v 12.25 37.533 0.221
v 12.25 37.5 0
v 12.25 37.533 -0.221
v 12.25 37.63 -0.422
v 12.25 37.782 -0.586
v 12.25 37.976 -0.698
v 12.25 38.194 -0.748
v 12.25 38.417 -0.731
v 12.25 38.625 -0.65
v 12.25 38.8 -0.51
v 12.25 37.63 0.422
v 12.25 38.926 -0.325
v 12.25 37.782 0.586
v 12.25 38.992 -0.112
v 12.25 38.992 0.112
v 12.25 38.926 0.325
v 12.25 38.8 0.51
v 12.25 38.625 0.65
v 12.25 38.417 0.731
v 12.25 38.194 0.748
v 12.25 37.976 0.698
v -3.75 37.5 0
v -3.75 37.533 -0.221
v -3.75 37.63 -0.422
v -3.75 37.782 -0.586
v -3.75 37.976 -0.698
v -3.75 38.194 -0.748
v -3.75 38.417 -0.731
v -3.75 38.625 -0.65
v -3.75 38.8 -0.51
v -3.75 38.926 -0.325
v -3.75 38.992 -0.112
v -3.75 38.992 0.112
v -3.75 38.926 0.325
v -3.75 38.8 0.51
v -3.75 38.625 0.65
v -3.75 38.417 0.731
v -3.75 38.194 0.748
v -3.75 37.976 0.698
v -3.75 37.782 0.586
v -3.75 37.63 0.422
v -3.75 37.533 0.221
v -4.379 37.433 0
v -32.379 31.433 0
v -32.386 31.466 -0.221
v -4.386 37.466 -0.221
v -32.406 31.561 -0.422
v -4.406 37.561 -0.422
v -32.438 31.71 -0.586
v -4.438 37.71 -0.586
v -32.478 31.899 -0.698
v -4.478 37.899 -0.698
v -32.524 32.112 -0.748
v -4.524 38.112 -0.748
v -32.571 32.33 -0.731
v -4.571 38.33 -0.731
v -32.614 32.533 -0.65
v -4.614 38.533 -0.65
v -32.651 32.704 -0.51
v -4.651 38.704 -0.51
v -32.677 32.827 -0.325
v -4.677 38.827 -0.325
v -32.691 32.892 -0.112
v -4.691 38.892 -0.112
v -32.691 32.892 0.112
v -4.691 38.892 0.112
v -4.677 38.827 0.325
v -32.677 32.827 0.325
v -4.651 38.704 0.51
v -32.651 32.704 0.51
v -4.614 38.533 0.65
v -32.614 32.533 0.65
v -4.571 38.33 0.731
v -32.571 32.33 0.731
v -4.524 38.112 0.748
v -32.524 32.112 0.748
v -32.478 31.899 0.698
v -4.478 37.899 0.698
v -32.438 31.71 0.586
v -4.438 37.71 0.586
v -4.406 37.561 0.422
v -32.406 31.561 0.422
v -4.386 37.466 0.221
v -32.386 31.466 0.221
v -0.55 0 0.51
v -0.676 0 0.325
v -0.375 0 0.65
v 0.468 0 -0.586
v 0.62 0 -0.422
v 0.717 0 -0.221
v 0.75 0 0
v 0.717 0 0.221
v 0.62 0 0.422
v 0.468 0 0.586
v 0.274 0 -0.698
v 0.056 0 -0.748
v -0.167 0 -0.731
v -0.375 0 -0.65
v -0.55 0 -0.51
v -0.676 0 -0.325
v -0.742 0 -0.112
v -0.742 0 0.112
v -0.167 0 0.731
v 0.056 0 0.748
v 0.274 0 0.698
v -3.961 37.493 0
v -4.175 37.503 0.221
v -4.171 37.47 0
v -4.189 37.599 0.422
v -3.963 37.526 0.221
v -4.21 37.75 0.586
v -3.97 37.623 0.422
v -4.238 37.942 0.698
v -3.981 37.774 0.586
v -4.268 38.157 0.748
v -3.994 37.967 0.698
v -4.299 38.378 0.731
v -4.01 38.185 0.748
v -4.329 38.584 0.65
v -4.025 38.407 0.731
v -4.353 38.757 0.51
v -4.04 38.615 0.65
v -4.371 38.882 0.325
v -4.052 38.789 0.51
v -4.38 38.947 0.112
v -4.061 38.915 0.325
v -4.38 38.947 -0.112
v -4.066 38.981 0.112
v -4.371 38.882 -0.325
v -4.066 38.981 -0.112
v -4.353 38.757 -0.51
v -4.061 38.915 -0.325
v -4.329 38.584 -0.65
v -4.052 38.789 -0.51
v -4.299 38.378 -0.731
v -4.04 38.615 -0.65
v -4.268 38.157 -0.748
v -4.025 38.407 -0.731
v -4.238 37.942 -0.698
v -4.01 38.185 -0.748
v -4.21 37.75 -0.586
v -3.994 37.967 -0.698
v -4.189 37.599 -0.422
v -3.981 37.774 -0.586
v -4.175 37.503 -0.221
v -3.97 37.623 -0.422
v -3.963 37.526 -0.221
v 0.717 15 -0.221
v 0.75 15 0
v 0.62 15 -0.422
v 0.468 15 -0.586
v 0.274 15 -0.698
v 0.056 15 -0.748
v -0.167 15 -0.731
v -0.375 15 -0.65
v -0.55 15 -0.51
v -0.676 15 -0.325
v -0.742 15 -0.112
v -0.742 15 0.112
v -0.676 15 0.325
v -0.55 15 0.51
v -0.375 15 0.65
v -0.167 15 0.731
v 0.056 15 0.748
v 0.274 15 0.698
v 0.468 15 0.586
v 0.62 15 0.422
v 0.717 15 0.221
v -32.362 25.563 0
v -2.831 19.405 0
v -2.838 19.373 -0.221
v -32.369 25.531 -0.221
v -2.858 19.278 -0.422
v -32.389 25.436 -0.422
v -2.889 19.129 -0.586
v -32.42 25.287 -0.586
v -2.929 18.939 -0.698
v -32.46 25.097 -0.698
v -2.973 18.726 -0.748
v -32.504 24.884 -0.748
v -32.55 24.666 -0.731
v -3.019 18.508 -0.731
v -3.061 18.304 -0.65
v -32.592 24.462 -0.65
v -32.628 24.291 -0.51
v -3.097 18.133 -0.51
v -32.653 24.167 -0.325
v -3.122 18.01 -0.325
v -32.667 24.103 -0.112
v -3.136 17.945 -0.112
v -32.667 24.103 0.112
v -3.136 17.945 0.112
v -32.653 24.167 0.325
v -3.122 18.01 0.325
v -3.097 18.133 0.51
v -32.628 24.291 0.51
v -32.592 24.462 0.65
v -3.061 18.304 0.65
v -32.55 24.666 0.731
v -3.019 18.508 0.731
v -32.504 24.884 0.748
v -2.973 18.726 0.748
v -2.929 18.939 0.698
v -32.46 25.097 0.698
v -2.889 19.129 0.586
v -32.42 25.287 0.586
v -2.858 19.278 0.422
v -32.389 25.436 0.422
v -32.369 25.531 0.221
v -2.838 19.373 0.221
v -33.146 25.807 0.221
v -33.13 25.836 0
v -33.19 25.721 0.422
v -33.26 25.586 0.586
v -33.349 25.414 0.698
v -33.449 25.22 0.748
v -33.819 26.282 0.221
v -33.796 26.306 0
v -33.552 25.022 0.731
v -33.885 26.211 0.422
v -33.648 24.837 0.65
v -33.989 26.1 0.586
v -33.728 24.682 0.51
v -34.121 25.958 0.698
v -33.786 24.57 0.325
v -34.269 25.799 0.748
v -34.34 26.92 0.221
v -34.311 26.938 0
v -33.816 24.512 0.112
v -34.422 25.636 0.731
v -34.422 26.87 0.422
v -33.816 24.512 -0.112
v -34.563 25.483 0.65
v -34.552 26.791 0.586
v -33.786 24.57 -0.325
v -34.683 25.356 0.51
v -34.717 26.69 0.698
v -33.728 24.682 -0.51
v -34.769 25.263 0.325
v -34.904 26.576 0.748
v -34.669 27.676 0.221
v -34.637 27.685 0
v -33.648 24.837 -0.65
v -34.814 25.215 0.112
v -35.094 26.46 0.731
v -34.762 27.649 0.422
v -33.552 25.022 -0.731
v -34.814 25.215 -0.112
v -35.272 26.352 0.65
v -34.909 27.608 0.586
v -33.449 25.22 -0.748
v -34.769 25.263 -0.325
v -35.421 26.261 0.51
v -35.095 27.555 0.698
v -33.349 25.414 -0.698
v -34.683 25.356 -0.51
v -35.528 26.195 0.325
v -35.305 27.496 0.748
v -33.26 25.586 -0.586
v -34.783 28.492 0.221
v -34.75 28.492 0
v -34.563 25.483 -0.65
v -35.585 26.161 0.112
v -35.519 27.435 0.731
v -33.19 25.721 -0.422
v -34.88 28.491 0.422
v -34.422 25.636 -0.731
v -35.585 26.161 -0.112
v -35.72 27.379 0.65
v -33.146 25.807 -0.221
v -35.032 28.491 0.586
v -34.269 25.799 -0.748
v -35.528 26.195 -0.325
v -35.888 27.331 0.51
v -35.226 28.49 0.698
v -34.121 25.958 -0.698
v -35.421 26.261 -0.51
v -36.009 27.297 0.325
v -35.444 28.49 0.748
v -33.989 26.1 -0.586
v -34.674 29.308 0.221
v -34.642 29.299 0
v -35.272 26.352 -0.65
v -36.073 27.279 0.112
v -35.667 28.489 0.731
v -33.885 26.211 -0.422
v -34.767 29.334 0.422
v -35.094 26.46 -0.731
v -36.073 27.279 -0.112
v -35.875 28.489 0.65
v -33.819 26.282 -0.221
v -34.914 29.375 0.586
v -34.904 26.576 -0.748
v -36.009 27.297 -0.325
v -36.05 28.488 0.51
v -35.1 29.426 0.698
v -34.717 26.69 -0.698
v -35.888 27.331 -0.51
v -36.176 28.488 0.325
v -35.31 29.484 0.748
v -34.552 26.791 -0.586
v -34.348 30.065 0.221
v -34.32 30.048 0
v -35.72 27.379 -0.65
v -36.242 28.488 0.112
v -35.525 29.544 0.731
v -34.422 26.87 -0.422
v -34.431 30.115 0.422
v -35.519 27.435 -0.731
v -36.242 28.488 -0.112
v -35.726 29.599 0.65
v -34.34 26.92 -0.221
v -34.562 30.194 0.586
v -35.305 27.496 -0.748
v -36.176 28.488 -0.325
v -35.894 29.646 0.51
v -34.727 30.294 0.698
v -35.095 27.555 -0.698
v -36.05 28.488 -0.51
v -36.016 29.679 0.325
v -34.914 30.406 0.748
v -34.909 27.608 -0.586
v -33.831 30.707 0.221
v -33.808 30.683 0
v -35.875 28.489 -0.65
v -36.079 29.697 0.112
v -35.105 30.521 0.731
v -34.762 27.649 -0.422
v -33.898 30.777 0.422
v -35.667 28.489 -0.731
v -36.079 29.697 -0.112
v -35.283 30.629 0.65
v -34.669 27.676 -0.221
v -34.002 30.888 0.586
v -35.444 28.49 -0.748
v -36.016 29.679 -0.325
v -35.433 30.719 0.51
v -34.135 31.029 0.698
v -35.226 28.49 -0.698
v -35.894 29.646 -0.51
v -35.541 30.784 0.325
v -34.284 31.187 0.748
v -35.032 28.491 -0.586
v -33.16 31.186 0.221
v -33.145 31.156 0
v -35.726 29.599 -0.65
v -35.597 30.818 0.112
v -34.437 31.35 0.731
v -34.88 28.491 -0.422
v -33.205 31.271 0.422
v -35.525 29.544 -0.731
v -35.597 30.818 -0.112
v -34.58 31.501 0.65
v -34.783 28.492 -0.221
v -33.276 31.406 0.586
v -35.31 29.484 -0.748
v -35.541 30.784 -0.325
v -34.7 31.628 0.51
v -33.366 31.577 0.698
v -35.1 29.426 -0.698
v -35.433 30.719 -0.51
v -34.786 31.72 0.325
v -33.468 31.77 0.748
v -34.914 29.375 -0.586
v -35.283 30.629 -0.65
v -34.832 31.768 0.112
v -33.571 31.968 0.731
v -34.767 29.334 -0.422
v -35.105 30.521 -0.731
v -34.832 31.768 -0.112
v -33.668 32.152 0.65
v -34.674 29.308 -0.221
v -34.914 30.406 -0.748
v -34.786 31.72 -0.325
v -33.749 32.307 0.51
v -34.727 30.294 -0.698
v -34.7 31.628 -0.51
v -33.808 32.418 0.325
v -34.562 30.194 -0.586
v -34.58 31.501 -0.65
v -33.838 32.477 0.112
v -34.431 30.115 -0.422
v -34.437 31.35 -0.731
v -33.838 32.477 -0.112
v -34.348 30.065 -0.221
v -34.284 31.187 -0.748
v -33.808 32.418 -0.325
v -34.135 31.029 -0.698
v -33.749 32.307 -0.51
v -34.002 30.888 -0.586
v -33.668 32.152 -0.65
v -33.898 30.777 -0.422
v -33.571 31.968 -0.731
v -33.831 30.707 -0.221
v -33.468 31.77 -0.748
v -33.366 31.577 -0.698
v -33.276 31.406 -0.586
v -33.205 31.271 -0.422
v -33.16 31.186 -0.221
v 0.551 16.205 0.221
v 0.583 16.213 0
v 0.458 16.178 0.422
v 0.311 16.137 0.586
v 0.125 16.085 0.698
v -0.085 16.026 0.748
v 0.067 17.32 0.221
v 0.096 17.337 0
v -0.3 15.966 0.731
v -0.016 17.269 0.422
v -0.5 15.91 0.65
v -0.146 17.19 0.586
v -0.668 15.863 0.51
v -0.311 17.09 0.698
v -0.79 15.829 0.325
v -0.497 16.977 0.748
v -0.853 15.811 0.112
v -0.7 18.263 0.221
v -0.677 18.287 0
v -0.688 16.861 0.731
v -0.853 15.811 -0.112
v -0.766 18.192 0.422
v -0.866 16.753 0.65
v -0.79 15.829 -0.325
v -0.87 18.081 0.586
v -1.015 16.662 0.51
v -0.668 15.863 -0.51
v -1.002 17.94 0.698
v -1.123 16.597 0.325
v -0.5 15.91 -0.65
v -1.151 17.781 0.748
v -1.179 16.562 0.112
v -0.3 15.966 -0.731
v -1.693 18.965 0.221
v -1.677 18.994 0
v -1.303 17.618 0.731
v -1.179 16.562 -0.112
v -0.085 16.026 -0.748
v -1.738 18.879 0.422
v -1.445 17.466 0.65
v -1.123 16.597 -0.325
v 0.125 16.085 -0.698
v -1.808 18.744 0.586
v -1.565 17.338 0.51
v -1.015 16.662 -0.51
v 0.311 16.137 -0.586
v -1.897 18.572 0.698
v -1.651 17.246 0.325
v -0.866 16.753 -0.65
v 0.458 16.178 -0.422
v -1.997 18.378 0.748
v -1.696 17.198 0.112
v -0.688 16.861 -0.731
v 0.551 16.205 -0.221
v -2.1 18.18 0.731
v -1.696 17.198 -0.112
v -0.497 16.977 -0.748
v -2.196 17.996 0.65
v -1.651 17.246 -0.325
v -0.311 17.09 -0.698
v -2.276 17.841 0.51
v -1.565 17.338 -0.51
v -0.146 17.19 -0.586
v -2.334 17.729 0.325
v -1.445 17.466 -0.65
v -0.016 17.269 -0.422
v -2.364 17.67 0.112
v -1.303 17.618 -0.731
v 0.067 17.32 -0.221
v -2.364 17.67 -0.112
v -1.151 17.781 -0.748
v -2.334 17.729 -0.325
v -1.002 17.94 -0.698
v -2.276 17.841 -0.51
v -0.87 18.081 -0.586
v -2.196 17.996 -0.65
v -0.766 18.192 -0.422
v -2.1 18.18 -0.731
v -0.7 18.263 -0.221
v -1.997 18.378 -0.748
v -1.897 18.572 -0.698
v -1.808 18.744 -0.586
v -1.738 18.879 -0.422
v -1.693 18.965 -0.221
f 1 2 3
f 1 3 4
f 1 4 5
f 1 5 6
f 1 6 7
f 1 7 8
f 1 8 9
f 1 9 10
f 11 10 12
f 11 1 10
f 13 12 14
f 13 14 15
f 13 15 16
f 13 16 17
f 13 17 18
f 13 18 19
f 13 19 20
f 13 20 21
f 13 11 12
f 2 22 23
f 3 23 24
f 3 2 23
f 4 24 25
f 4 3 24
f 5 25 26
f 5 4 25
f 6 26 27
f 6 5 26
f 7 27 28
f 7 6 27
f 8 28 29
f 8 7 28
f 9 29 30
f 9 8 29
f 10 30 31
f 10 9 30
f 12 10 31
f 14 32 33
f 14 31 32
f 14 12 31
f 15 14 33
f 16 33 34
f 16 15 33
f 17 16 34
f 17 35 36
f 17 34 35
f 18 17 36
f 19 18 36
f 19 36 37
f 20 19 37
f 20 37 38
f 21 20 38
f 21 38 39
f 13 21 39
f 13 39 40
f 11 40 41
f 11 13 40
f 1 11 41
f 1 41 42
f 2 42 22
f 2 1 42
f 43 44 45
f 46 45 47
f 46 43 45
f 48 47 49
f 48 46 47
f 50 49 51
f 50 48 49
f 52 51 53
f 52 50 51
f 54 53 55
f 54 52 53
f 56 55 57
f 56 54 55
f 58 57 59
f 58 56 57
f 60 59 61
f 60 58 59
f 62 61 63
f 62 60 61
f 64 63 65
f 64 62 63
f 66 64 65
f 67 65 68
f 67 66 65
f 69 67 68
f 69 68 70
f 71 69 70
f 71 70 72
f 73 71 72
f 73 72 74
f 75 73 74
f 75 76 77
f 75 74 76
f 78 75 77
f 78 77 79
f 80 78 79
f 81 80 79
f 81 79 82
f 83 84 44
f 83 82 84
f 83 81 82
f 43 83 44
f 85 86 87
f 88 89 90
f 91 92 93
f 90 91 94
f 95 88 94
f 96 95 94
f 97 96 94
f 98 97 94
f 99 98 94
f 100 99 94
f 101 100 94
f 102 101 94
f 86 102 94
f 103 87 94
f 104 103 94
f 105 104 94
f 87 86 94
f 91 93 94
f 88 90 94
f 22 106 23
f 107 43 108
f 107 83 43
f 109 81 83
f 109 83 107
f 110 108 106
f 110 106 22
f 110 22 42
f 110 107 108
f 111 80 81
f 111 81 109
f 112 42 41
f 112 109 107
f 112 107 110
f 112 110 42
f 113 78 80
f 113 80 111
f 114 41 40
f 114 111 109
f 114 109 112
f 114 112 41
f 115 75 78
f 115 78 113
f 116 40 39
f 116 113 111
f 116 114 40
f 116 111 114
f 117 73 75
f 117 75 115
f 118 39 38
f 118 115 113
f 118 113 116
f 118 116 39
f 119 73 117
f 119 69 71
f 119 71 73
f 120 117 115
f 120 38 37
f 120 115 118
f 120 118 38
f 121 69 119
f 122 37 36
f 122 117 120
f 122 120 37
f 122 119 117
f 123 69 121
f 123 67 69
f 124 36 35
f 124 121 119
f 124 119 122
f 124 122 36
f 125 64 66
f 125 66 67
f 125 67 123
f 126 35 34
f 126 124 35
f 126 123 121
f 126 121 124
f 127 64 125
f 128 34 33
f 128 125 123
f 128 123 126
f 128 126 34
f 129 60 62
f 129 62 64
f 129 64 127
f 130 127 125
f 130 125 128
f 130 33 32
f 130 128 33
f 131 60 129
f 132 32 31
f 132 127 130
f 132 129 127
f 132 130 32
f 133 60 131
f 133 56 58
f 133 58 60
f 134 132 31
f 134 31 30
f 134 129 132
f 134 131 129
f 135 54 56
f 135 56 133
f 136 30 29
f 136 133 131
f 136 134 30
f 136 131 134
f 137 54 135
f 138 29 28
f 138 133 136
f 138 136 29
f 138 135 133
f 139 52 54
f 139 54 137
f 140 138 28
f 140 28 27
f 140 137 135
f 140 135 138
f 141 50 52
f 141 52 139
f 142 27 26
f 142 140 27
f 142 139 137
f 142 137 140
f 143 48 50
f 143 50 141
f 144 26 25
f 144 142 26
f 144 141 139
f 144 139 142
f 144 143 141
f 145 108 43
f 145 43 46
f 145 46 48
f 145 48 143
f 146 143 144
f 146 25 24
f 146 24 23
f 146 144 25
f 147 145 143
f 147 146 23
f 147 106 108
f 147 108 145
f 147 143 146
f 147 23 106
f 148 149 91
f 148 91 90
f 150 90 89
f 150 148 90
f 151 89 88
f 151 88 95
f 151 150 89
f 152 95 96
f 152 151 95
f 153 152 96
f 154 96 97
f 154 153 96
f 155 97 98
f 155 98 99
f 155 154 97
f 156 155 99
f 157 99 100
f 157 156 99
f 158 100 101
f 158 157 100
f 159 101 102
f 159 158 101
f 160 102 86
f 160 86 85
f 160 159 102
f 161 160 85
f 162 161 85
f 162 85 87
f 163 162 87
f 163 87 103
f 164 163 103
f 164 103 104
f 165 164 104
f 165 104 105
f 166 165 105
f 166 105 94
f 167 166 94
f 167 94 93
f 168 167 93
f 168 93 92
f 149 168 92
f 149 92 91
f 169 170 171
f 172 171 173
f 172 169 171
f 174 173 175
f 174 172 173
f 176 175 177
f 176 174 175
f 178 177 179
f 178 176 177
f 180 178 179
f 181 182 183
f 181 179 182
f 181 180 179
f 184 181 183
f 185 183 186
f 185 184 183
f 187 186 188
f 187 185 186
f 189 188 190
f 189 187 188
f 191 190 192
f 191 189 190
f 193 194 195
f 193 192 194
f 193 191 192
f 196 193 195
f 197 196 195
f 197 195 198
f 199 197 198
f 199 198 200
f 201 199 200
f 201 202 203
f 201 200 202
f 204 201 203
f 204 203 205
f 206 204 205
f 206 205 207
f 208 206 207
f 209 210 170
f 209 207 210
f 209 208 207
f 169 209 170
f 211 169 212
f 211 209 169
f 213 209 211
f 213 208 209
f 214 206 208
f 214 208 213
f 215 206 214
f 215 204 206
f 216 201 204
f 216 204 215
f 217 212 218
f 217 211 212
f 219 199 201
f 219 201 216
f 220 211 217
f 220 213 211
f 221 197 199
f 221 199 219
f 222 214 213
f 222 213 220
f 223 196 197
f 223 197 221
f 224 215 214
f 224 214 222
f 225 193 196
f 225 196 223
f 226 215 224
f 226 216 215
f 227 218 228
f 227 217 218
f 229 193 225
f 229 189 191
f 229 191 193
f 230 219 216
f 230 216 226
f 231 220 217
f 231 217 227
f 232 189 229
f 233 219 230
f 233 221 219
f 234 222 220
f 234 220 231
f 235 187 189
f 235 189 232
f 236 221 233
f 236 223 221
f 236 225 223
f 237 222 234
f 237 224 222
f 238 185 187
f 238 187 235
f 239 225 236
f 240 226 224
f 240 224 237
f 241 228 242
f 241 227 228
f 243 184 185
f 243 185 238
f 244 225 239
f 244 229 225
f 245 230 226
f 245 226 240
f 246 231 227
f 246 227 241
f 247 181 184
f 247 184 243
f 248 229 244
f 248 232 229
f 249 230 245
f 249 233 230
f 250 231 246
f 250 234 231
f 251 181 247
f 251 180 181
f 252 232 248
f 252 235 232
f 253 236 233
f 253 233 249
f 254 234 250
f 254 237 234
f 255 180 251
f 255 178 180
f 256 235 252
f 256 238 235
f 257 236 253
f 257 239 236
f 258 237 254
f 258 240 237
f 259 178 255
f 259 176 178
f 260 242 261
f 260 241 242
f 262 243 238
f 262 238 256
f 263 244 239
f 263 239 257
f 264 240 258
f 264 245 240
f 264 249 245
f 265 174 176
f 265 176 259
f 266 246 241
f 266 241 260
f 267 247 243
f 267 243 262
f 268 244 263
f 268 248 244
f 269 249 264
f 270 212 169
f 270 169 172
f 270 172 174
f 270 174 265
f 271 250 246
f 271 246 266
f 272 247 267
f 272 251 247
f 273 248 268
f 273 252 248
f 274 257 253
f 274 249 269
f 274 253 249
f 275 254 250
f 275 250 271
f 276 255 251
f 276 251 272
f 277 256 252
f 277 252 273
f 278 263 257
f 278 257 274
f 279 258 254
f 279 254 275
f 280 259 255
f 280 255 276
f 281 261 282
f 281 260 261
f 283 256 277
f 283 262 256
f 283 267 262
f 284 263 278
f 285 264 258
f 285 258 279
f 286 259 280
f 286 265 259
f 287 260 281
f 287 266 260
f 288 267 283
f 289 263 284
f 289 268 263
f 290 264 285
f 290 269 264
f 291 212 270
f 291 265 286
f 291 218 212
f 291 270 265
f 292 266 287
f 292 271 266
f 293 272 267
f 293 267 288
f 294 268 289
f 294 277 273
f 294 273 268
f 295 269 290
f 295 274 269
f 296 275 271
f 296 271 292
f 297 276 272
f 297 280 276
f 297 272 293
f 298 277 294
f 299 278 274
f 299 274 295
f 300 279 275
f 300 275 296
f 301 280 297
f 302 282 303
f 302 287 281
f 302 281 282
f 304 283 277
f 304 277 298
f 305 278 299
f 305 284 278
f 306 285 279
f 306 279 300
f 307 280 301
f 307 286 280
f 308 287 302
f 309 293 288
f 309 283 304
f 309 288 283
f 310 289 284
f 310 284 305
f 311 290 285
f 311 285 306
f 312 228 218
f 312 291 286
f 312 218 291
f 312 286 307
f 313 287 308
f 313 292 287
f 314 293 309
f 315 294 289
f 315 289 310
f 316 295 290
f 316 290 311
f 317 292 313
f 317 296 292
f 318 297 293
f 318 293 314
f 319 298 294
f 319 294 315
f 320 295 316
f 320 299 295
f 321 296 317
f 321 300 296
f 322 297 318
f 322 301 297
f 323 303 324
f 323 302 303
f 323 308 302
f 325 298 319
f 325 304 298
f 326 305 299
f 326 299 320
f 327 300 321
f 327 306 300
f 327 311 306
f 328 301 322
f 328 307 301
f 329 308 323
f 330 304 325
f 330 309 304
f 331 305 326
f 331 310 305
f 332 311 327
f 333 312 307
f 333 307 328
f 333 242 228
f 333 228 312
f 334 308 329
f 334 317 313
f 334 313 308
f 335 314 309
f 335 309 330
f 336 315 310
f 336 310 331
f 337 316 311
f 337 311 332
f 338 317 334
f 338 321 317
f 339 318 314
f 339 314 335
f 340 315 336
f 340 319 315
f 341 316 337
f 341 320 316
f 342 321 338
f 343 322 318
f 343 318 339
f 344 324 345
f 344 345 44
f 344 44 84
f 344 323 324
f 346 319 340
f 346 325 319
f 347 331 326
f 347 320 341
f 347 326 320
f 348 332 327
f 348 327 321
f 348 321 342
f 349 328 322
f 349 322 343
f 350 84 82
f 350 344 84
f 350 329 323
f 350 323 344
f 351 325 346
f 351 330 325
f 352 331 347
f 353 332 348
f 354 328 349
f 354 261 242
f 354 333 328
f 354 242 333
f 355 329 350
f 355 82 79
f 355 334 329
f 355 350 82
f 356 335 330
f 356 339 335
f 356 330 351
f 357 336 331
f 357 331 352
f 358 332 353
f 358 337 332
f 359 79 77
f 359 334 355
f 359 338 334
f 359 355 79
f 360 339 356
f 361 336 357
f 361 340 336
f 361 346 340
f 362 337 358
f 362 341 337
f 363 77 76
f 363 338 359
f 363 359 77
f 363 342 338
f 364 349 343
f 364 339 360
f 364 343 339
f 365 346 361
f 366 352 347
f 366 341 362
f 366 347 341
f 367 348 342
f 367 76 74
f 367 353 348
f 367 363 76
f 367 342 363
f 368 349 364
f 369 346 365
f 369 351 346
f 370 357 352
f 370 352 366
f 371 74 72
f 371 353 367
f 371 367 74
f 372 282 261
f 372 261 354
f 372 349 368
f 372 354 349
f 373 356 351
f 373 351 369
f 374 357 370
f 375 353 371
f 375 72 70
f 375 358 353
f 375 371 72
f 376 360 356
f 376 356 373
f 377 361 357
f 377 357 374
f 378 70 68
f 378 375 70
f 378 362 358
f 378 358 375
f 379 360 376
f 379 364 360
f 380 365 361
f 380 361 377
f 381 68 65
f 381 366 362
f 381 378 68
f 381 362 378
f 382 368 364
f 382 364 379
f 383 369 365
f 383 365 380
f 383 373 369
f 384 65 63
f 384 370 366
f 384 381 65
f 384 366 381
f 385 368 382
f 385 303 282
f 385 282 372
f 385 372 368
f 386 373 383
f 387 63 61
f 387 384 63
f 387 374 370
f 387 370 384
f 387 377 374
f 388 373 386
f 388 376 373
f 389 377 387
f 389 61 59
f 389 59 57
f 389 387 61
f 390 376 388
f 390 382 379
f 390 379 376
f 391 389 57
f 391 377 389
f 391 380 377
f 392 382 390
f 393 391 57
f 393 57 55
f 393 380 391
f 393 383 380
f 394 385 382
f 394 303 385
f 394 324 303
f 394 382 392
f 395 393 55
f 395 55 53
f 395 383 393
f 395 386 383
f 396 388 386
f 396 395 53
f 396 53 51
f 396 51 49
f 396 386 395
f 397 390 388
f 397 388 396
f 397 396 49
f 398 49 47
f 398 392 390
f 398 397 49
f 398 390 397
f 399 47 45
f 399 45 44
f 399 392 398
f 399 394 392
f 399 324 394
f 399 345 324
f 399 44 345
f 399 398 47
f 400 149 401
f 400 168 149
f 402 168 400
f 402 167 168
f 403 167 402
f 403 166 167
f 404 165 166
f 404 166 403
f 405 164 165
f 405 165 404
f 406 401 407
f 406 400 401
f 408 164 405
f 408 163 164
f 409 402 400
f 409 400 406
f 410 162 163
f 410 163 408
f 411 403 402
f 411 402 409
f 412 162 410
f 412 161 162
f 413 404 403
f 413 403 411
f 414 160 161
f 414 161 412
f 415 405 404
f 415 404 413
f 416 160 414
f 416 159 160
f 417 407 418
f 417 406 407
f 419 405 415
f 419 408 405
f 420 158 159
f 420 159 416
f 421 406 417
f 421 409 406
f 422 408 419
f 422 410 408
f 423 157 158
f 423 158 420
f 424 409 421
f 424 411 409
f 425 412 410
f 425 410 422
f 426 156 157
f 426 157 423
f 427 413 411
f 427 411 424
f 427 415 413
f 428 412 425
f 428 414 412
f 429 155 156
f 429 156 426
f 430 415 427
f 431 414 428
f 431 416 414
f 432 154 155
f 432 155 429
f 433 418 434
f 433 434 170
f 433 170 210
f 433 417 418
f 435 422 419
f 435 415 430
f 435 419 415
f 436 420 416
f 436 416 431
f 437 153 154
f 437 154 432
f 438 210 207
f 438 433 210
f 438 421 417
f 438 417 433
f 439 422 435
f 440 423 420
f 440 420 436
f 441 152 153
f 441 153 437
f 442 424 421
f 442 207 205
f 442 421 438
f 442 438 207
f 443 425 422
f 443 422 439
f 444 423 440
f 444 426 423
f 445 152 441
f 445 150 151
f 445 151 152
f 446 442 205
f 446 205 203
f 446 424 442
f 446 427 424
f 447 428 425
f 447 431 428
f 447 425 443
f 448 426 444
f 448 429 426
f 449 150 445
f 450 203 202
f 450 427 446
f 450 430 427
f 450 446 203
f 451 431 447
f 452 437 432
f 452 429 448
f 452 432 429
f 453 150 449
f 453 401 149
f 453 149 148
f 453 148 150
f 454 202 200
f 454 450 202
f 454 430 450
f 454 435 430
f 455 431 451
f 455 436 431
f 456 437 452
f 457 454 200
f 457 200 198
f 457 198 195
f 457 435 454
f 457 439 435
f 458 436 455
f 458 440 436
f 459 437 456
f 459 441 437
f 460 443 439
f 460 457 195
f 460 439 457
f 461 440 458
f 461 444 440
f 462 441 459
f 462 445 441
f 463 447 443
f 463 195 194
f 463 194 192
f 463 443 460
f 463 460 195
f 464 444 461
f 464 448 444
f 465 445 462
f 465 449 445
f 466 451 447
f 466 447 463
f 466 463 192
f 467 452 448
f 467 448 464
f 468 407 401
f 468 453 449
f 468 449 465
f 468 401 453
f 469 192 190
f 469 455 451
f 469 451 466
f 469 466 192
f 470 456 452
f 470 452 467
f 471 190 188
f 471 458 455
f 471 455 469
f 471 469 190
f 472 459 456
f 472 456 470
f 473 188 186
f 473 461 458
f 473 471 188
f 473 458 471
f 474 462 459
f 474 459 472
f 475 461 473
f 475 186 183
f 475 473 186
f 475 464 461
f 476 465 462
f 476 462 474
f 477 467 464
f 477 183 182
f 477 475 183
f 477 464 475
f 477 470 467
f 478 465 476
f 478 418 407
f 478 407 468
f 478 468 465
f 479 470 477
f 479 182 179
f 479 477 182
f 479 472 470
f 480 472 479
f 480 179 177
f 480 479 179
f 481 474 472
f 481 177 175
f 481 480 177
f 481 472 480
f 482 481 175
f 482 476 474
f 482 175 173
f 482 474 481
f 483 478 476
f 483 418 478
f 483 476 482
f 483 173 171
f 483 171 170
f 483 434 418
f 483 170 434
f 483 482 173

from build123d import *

# Parameters (mm, degrees)
SKIZZE2_R = 0.75


with BuildPart() as part:
    # Austragung1: sweep along a path in Skizze1
    with BuildLine(Plane.XY) as austragung1_path:
        Line((0, 0), (0, 15))
        ThreePointArc((0, 15), (-0.840264248, 17.365573473), (-2.98450019, 18.671036644))
        Line((-2.98450019, 18.671036644), (-32.51549981, 24.828963356))
        ThreePointArc((-32.51549981, 24.828963356), (-35.499985743, 28.489659261), (-32.535734083, 32.166759053))
        Line((-32.535734083, 32.166759053), (-4.535734083, 38.166759053))
        ThreePointArc((-4.535734083, 38.166759053), (-4.145065534, 38.229131698), (-3.75, 38.25))
        Line((-3.75, 38.25), (12.25, 38.25))
    # Skizze2 → Austragung1 (sweep)
    with BuildSketch(Plane(origin=(0, 0, 0), x_dir=(1, 0, 0), z_dir=(0, 1, 0))):
        Circle(SKIZZE2_R)
    sweep(path=austragung1_path.line)


solid = part.part
